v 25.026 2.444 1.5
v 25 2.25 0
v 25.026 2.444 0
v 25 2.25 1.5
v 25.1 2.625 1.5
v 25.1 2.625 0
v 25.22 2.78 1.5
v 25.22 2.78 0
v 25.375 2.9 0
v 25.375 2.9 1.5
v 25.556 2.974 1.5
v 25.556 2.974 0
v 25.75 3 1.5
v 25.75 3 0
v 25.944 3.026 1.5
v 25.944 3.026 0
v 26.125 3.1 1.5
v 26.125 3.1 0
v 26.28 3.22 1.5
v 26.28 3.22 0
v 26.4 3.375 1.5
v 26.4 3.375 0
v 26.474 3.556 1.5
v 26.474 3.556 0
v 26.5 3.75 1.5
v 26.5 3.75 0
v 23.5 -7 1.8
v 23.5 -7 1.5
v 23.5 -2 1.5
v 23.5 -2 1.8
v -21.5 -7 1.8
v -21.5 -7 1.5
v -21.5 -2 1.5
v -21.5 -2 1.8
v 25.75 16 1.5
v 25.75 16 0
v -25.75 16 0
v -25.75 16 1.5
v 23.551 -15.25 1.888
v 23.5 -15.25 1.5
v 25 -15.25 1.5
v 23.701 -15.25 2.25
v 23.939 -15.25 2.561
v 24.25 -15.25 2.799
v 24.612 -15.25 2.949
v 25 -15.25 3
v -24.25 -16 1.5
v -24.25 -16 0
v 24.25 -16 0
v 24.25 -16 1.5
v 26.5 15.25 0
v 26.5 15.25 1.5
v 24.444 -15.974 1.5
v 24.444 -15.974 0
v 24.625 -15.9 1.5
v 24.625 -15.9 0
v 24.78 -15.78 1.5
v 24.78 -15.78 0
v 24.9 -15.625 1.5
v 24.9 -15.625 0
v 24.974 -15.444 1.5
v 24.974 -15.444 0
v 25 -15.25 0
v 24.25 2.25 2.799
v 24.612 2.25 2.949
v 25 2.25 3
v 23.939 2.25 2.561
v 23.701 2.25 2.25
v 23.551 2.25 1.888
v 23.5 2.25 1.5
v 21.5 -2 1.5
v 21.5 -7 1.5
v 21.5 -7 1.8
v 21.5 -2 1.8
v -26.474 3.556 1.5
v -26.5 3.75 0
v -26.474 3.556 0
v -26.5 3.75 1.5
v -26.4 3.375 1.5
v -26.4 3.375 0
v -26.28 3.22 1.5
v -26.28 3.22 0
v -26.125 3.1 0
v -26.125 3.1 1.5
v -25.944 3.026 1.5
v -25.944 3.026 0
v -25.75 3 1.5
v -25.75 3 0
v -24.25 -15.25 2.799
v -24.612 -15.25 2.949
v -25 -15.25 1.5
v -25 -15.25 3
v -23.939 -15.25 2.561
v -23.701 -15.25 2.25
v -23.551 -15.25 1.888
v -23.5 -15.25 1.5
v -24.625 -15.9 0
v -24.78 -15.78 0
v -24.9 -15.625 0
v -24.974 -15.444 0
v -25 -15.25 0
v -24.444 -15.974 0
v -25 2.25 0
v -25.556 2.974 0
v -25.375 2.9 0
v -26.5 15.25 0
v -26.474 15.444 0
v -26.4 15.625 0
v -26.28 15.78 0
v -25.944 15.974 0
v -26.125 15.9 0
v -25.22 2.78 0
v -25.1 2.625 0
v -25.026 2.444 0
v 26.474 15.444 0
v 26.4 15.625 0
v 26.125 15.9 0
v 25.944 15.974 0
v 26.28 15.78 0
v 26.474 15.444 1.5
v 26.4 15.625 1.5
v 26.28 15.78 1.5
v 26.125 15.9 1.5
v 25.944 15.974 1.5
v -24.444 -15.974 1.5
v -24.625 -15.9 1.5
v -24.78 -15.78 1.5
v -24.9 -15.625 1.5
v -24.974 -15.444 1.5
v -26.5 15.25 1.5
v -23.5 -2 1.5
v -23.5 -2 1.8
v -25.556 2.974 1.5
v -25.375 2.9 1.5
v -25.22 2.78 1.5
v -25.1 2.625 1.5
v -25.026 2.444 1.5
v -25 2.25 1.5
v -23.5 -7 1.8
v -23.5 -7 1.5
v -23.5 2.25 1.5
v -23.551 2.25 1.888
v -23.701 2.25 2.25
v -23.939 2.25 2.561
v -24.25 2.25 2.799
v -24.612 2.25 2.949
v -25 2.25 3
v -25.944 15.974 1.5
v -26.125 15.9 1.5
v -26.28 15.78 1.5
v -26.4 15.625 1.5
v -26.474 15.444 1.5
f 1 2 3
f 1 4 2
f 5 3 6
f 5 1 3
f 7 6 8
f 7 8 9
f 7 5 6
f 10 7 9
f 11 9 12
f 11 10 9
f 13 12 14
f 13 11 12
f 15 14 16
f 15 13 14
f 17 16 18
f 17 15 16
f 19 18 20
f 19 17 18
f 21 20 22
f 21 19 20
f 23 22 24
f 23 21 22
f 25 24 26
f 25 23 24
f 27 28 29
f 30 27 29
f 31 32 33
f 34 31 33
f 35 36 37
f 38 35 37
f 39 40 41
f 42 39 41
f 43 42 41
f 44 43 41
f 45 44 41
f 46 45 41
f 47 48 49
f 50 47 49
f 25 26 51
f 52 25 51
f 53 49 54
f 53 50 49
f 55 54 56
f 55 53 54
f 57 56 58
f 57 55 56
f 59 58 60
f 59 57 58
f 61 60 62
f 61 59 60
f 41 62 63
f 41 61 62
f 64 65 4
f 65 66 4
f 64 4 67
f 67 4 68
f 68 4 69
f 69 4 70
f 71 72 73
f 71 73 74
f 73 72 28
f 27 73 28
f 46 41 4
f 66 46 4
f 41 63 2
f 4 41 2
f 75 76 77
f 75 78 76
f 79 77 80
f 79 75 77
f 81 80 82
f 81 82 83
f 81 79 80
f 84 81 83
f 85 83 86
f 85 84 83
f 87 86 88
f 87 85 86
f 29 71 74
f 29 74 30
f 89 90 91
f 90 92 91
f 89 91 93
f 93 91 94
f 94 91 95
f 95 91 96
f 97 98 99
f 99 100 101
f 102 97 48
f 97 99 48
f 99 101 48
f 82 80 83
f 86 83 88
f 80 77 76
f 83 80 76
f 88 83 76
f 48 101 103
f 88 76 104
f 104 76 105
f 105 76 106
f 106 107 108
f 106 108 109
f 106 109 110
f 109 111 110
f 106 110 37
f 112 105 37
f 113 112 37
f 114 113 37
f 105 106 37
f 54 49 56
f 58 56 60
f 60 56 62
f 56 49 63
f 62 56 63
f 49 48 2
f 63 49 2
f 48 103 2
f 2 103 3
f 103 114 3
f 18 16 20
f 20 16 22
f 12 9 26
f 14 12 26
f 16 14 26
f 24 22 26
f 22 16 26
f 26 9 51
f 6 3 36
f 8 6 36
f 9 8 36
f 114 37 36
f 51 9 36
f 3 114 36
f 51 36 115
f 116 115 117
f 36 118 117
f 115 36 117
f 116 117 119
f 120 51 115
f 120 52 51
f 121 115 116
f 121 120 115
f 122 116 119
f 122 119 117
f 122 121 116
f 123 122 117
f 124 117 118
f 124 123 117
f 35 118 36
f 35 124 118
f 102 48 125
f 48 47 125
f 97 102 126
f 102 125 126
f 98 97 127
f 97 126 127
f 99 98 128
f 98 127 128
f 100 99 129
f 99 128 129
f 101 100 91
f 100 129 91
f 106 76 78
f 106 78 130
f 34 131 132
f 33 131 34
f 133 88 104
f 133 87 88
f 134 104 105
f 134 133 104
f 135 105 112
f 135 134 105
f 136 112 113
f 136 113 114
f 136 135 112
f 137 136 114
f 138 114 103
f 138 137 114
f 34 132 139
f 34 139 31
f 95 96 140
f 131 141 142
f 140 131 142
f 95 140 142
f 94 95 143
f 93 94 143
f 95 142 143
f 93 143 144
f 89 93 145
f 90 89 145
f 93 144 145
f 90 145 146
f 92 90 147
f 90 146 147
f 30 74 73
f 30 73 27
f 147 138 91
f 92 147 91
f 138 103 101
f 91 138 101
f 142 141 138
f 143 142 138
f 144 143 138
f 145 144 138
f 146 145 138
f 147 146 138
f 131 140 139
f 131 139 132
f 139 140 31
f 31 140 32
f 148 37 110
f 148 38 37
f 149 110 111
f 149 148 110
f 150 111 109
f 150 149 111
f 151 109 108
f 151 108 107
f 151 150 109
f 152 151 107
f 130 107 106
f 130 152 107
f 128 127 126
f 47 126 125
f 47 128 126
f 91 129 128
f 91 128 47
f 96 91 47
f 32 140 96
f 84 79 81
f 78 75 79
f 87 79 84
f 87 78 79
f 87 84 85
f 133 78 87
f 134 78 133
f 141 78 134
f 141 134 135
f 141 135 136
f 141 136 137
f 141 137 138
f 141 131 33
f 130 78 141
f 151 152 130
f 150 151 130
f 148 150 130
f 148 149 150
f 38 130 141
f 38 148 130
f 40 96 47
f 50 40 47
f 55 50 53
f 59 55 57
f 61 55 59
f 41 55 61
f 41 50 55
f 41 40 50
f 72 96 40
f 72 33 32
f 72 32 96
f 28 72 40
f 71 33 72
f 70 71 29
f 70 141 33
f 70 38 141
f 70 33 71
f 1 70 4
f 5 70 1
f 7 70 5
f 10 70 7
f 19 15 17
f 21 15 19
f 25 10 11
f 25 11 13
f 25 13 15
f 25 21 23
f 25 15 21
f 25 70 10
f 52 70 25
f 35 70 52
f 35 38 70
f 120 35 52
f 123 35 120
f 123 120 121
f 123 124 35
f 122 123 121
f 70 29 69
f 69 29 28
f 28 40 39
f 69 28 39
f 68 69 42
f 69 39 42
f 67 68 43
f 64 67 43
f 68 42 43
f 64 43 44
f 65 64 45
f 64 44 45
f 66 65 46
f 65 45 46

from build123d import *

# Parameters (mm, degrees)
F0_W     = 50
F0_H     = 19
F0_H_2   = 13
F0_W_2   = 1.5
F1_DEPTH = 1.5
F2_R     = 0.74999
F4_DEPTH = 1.5
F5_R     = 1.49999
F3_W     = 2
F3_H     = 5
F6_DEPTH = 0.3


# Not quite as in the source:
# - a fillet or chamfer is up to 0.001 mm smaller than in the source, because OpenCascade refuses the exact size


with BuildPart() as f1:
    # F0 (on Top) → F1 (new body)
    with BuildSketch(Plane.XY):
        with Locations((0, -6.5)):
            Rectangle(F0_W, F0_H)
        with Locations((0, 9.5)):
            Rectangle(F0_W, F0_H_2)
        with Locations((-25.75, 9.5)):
            Rectangle(F0_W_2, F0_H_2)
        with Locations((25.75, 9.5)):
            Rectangle(F0_W_2, F0_H_2)
    extrude(amount=F1_DEPTH)

    # F2 (radius 0.75 in the source; OpenCascade refuses exactly that, so slightly less here)
    f2_edges = [f1.edges().sort_by_distance(p)[0] for p in [
        (-26.5, 16, 0.75),
        (-26.5, 3, 0.75),
        (-25, 3, 0.75),
        (-25, -16, 0.75),
        (25, -16, 0.75),
        (25, 3, 0.75),
        (26.5, 3, 0.75),
        (26.5, 16, 0.75),
    ]]
    fillet(f2_edges, radius=F2_R)

    # F3 (on face) → F4 (join)
    with BuildSketch(Plane.XY.offset(1.5)):
        Polygon((-23.5, 2.25), (-25, 2.25), (-25, -15.25), (-23.5, -15.25), (-23.5, -7), (-23.5, -2), align=None)
        Polygon((23.5, -15.25), (25, -15.25), (25, 2.25), (23.5, 2.25), (23.5, -2), (23.5, -7), align=None)
    extrude(amount=F4_DEPTH)

    # F5 (radius 1.5 in the source; OpenCascade refuses exactly that, so slightly less here)
    f5_edges = [f1.edges().sort_by_distance(p)[0] for p in [
        (-23.5, -6.5, 3),
        (23.5, -6.5, 3),
    ]]
    fillet(f5_edges, radius=F5_R)

    # F3 (on face) → F6 (join)
    with BuildSketch(Plane.XY.offset(1.5)):
        with Locations((-22.5, -4.5)):
            Rectangle(F3_W, F3_H)
        with Locations((22.5, -4.5)):
            Rectangle(F3_W, F3_H)
    extrude(amount=F6_DEPTH)


solid = f1.part
